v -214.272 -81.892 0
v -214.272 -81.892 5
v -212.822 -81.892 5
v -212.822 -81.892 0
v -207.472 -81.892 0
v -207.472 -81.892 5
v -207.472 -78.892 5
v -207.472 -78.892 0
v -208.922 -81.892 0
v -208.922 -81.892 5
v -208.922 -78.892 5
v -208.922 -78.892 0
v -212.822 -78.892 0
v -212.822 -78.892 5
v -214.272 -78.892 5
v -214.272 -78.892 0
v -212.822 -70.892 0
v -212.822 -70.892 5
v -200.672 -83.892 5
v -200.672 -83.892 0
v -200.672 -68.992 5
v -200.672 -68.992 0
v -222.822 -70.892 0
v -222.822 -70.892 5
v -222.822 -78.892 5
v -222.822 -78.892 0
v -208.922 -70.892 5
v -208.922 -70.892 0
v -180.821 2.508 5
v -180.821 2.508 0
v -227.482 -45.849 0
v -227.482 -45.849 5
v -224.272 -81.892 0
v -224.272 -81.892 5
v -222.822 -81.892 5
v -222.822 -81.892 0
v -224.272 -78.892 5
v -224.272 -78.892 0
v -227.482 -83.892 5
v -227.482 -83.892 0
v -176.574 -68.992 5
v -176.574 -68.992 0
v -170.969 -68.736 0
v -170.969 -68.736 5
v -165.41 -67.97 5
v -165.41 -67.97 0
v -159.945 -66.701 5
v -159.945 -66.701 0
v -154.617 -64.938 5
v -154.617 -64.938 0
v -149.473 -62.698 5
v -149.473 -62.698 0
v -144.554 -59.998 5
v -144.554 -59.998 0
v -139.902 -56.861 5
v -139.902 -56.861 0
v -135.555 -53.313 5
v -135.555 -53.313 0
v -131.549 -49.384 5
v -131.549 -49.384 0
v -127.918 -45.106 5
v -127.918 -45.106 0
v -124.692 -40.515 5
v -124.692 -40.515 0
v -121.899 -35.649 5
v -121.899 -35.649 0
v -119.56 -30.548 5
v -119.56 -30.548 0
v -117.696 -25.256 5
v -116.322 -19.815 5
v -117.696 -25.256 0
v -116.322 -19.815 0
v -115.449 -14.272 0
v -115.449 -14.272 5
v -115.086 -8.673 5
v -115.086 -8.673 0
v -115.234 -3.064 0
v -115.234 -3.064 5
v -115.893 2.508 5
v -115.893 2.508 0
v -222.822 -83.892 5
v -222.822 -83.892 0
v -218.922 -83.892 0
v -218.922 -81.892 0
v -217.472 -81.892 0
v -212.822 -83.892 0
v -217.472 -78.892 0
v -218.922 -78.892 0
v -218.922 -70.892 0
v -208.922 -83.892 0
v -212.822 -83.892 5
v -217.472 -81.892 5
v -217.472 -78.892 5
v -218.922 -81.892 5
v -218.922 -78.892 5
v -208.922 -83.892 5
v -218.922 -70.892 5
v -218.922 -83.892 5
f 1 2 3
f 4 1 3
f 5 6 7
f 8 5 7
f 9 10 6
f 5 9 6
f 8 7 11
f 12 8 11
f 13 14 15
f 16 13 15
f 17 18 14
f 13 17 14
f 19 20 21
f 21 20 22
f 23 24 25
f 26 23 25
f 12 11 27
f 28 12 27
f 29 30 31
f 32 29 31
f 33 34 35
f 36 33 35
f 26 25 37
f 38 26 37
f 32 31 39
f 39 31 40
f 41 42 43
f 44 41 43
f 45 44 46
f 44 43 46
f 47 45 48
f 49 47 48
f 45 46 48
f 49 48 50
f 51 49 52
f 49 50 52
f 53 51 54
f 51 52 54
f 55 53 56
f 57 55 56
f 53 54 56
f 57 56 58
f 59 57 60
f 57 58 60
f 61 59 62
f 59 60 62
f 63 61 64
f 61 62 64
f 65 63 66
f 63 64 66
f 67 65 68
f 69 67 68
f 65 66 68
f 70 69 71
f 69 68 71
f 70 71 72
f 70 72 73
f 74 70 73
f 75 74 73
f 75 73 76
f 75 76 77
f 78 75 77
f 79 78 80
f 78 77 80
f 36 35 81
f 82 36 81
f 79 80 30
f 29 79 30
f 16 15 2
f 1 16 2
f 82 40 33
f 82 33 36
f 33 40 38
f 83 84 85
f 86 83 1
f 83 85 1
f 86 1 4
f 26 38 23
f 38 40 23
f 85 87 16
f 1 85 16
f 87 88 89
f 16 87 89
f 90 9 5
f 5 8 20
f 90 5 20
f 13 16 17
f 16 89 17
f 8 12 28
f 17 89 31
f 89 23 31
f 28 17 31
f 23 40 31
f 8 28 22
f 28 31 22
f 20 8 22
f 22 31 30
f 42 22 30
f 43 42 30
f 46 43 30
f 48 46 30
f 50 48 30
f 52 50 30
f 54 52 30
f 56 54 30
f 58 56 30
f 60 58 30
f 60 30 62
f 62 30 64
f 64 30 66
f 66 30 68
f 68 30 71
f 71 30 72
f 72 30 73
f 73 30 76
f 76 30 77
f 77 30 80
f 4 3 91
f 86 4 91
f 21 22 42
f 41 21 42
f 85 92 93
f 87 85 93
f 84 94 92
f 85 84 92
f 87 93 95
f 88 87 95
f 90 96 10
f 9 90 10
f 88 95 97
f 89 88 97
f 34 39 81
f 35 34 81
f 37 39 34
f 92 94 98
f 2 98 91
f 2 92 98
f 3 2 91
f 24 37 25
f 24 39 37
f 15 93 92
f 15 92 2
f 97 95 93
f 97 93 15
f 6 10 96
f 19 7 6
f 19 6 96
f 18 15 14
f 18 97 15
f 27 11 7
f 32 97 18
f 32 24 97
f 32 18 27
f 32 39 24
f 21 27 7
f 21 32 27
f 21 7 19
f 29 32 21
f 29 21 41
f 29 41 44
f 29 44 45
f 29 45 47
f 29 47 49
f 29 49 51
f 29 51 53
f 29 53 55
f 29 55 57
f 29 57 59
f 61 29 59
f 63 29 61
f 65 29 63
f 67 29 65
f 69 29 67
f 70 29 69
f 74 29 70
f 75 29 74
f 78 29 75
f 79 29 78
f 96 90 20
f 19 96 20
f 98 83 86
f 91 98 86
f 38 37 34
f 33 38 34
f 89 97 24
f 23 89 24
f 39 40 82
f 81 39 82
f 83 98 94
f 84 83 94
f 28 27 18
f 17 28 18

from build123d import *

# Parameters (mm, degrees)
BOSS_EXTRUDE1_DEPTH = 5
CUT_EXTRUDE1_DEPTH  = 5


with BuildPart() as part:
    # Sketch2 → Boss-Extrude1 (new body)
    with BuildSketch(Plane.XY):
        with BuildLine():
            Line((-227.482425682, -83.89157587), (-200.672425682, -83.89157587))
            Line((-200.672425682, -83.89157587), (-200.672425682, -68.99157587))
            Line((-200.672425682, -68.99157587), (-176.574253233, -68.99157587))
            ThreePointArc((-176.574253233, -68.99157587), (-129.684755475, -47.286361961), (-115.892707438, 2.50842413))
            Line((-115.892707438, 2.50842413), (-180.821327591, 2.50842413))
            Line((-180.821327591, 2.50842413), (-227.482425682, -45.84868874))
            Line((-227.482425682, -45.84868874), (-227.482425682, -83.89157587))
        make_face()
    extrude(amount=BOSS_EXTRUDE1_DEPTH)

    # Sketch4 → Cut-Extrude1 (cut)
    with BuildSketch(Plane.XY.offset(5)):
        Polygon((-212.822425682, -83.89157587), (-208.922425682, -83.89157587), (-208.922425682, -81.89157587), (-207.472425682, -81.89157587), (-207.472425682, -78.89157587), (-208.922425682, -78.89157587), (-208.922425682, -70.89157587), (-212.822425682, -70.89157587), (-212.822425682, -78.89157587), (-214.272425682, -78.89157587), (-214.272425682, -81.89157587), (-212.822425682, -81.89157587), align=None)
        Polygon((-222.822425682, -83.89157587), (-218.922425682, -83.89157587), (-218.922425682, -81.89157587), (-217.472425682, -81.89157587), (-217.472425682, -78.89157587), (-218.922425682, -78.89157587), (-218.922425682, -70.89157587), (-222.822425682, -70.89157587), (-222.822425682, -78.89157587), (-224.272425682, -78.89157587), (-224.272425682, -81.89157587), (-222.822425682, -81.89157587), align=None)
    extrude(amount=-CUT_EXTRUDE1_DEPTH, mode=Mode.SUBTRACT)


solid = part.part
